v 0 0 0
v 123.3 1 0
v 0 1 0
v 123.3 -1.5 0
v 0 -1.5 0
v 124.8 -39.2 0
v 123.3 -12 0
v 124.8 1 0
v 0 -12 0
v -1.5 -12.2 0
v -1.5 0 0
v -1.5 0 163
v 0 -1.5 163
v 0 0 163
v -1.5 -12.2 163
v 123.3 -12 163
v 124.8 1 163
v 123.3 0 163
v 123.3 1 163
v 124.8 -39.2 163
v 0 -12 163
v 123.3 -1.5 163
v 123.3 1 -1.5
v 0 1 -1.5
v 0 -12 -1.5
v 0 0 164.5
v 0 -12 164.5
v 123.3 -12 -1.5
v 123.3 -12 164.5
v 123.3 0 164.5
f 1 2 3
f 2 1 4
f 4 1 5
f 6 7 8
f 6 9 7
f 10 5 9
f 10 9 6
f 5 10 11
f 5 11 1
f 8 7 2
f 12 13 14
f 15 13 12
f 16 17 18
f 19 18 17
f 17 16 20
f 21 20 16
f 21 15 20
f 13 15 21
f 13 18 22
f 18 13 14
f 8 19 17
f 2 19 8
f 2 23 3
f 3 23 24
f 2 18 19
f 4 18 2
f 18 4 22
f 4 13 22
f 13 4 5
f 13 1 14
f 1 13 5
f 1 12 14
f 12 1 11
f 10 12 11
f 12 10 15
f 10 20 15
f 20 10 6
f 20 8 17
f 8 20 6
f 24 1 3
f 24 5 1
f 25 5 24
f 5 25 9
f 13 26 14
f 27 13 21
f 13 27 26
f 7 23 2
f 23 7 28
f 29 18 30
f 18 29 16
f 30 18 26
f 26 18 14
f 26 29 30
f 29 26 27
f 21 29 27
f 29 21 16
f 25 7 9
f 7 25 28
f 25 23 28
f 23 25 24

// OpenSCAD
// haczyk.scad
// Haczyk (hook / open bracket) modelled from the hand sketch haczyk.png
//
// Interpretation of the dimensions written on the drawing:
//   53 mm  - outer width          (50 inner + 3 wall)
//   50 mm  - inner width
//   20 mm  - height of the tall (right) wall
//   10 mm  - height of the short (left) wall
//    3 mm  - material thickness
//   20 mm  - depth (extrusion), taken from the top view
// The two unlabelled-looking values (17 and 5) are approximations of the
// inner step shown at the bottom of the profile; adjust foot_len / lip
// below if your reading differs.

// ----- parameters -----
long = 123.3;
walls = 1.5;
h1 = 1.5;
h2 = 2.5;
H1 = 13.2;
H2 = 40.2;

long2 = 163;
H3 = 13;

// 2D cross section of the hook, drawn in the XZ plane
module profile() {
    polygon(points = [
        [0,           0],           // outer 
        [0, -h1],
        [long, -h1],
        [long, -h1 + h2],
        [long + walls, -h1 + h2],
        [long + walls, -h1 + h2 - H2],
        [-walls, -h1 + h2 - H1],
        [-walls, 0]

    ]);
}


module profile2() {
    polygon(points = [
        [0,           0],           // outer 
        [0, -h1],
        [long2, -h1],
        [long2, -h1 + h2],
        [long2 + walls, -h1 + h2],
        [long2 + walls, -h1 + h2 - H3],
        [-walls, -h1 + h2 - H3],
        [-walls, 0]

    ]);
}
// ----- model -----
linear_extrude(height = 163)
    profile();


translate([0, 0, 163])
rotate([90, 90, 90])
linear_extrude(height = 123.3)
    profile2();
